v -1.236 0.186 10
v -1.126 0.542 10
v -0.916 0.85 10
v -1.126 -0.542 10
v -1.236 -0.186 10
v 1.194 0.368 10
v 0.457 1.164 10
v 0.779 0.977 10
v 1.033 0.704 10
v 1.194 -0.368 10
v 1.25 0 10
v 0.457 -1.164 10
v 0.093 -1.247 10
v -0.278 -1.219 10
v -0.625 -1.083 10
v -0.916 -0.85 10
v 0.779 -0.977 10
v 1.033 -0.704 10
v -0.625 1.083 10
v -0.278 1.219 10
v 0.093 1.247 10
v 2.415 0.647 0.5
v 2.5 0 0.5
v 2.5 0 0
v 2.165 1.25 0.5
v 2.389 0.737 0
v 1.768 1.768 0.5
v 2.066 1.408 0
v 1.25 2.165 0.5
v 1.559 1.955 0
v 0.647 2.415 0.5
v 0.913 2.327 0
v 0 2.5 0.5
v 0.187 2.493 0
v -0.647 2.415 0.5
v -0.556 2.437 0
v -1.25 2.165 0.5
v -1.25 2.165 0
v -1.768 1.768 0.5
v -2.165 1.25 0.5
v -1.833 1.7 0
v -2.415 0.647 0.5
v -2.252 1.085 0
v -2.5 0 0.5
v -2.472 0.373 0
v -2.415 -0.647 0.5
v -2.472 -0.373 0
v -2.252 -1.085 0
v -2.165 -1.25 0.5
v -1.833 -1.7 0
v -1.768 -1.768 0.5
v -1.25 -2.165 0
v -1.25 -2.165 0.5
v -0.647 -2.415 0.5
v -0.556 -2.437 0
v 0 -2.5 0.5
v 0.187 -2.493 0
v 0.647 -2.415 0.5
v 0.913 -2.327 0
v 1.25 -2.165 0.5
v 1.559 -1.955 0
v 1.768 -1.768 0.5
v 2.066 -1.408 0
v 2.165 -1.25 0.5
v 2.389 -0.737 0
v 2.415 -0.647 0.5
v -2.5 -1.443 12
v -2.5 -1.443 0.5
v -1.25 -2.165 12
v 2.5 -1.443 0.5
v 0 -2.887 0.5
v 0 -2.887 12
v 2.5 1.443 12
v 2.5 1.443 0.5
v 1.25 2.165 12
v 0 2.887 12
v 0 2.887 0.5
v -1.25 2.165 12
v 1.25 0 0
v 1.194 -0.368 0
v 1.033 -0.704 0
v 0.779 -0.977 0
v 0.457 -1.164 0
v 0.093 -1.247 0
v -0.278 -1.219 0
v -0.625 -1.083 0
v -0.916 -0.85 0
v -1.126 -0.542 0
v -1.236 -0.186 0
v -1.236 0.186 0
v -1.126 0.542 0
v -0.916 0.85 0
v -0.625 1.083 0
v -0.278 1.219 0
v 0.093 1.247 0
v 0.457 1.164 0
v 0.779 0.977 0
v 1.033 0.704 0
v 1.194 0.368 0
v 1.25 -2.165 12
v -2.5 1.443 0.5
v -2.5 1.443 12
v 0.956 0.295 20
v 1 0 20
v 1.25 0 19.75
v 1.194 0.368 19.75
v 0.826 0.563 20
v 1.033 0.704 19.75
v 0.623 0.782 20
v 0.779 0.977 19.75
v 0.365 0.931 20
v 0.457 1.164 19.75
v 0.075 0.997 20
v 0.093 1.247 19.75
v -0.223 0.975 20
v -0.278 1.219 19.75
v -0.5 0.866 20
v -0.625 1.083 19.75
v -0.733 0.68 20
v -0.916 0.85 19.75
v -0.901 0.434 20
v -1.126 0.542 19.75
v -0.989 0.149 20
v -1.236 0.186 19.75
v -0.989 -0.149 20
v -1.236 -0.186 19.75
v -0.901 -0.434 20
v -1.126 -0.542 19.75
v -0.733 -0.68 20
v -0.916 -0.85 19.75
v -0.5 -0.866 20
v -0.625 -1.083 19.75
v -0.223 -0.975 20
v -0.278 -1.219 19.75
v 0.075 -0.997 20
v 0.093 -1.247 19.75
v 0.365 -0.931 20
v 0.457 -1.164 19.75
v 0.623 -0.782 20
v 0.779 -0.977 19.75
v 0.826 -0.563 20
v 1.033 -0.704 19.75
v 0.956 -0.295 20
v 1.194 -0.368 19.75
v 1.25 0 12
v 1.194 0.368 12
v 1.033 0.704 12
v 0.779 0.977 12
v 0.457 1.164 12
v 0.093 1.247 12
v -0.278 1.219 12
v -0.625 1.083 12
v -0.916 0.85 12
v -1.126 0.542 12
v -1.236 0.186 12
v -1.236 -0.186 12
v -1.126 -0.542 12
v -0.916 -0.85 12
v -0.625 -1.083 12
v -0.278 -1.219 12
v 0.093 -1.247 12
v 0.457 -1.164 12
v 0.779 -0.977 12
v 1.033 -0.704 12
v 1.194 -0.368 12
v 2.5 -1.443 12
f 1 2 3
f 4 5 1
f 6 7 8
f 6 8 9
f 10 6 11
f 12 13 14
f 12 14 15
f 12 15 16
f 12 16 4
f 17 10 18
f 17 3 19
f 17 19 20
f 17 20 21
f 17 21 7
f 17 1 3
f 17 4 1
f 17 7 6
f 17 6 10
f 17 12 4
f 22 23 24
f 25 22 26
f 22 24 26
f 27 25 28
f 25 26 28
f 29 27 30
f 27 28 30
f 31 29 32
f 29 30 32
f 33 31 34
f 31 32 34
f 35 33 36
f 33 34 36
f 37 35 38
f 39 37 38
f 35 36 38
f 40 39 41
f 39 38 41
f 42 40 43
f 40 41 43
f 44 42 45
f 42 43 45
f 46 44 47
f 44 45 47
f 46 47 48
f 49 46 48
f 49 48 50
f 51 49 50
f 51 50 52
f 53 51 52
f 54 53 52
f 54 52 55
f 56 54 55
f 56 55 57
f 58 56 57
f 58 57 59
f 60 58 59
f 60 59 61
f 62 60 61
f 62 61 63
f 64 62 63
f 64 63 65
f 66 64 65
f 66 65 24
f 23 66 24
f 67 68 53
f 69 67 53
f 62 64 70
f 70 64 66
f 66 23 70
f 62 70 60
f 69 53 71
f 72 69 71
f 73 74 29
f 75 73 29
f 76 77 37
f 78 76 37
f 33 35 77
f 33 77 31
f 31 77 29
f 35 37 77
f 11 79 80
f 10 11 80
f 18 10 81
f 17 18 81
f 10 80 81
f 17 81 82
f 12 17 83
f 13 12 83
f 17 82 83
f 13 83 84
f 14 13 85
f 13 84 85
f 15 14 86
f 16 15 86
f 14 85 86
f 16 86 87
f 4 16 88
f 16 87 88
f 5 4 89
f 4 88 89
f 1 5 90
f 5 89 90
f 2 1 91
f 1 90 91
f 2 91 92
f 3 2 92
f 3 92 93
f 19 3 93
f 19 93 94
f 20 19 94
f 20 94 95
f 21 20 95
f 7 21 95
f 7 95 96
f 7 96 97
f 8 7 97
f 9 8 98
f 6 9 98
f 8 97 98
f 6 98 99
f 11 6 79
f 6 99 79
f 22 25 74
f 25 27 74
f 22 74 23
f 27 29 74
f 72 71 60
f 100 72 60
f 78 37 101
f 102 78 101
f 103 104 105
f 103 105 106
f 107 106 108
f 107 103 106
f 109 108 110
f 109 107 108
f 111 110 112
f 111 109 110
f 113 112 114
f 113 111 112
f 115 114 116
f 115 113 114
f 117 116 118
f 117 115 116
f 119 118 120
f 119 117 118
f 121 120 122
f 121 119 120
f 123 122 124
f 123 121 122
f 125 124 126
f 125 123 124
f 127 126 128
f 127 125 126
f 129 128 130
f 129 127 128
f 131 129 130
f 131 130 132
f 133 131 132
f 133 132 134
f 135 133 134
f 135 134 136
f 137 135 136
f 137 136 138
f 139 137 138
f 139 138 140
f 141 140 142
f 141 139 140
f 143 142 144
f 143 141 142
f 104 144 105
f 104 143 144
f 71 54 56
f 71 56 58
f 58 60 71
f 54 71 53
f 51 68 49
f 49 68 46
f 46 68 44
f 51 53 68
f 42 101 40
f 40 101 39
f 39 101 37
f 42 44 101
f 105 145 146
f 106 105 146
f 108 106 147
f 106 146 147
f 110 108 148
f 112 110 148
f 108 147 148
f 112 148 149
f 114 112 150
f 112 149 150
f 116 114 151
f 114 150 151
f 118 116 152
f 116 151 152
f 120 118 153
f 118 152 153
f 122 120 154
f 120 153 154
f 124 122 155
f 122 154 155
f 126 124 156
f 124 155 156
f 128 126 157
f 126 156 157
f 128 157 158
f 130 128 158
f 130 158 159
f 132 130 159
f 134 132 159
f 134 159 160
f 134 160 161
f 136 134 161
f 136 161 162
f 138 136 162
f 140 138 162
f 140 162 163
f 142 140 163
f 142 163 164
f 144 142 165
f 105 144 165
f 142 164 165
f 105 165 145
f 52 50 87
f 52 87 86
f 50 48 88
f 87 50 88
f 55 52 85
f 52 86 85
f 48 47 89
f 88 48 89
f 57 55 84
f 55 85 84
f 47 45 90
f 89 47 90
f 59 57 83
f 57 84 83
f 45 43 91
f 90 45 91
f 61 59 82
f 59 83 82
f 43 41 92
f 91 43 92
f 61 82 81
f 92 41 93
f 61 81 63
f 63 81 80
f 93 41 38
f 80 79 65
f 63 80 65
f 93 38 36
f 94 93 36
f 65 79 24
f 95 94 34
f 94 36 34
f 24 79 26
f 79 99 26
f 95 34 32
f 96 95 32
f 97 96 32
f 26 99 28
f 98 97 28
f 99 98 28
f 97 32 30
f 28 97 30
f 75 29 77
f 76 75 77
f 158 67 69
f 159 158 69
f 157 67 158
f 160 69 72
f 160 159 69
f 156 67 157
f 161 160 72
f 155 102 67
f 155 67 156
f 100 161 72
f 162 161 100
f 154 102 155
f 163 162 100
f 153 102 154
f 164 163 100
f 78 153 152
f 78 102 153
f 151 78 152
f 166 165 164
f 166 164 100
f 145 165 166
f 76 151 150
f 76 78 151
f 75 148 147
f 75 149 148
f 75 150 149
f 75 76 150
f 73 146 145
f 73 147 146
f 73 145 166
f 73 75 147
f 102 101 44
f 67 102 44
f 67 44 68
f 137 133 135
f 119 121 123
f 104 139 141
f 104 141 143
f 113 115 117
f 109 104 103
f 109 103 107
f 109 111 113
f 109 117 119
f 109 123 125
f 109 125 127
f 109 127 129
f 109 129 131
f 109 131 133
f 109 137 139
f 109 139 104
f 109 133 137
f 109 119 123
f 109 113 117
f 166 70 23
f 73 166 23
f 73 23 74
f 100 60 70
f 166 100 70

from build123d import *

# Parameters (mm, degrees)
F0_R     = 2.5
F1_DEPTH = 0.5
F3_DEPTH = 11.5
F4_R     = 1.25
F5_DEPTH = 8
F6_SIZE  = 0.25
F7_R     = 1.25
F8_DEPTH = 10


with BuildPart() as f1:
    # F0 (on Top) → F1 (new body)
    with BuildSketch(Plane.XY):
        Circle(F0_R)
    extrude(amount=F1_DEPTH)

    # F2 (on face) → F3 (join)
    with BuildSketch(Plane.XY.offset(0.5)):
        with BuildLine():
            Line((2.5, 0), (2.5, 1.443375673))
            Line((2.5, 1.443375673), (1.2500000021, 2.1650635082))
            ThreePointArc((1.2500000021, 2.1650635082), (2.1650635101, 1.2499999989), (2.5, 0))
        make_face()
        with BuildLine():
            Line((2.5, -1.443375673), (2.5, 0))
            ThreePointArc((2.5, 0), (2.1650635101, -1.2499999989), (1.2500000021, -2.1650635082))
            Line((1.2500000021, -2.1650635082), (2.5, -1.443375673))
        make_face()
        with BuildLine():
            Line((0, -2.8867513459), (1.2500000021, -2.1650635082))
            ThreePointArc((1.2500000021, -2.1650635082), (-1.35e-08, -2.5), (-1.2500000255, -2.1650634947))
            Line((-1.2500000255, -2.1650634947), (0, -2.8867513459))
        make_face()
        with BuildLine():
            Line((-2.5, -1.443375673), (-1.2500000255, -2.1650634947))
            ThreePointArc((-1.2500000255, -2.1650634947), (-2.1650635168, -1.2499999872), (-2.5, 0))
            Line((-2.5, 0), (-2.5, -1.443375673))
        make_face()
        with BuildLine():
            ThreePointArc((-2.5, 0), (-2.1650634924, 1.2500000296), (-1.2499999408, 2.1650635436))
            Line((-1.2499999408, 2.1650635436), (-2.5, 1.443375673))
            Line((-2.5, 1.443375673), (-2.5, 0))
        make_face()
        with BuildLine():
            ThreePointArc((1.2500000021, -2.1650635082), (2.1650635101, -1.2499999989), (2.5, 0))
            ThreePointArc((2.5, 0), (2.1650635101, 1.2499999989), (1.2500000021, 2.1650635082))
            ThreePointArc((1.2500000021, 2.1650635082), (3.54e-08, 2.5), (-1.2499999408, 2.1650635436))
            ThreePointArc((-1.2499999408, 2.1650635436), (-2.1650634924, 1.2500000296), (-2.5, 0))
            ThreePointArc((-2.5, 0), (-2.1650635168, -1.2499999872), (-1.2500000255, -2.1650634947))
            ThreePointArc((-1.2500000255, -2.1650634947), (-1.35e-08, -2.5), (1.2500000021, -2.1650635082))
        make_face()
        with BuildLine():
            ThreePointArc((-1.2499999408, 2.1650635436), (3.54e-08, 2.5), (1.2500000021, 2.1650635082))
            Line((1.2500000021, 2.1650635082), (0, 2.8867513459))
            Line((0, 2.8867513459), (-1.2499999408, 2.1650635436))
        make_face()
    extrude(amount=F3_DEPTH)

    # F4 (on face) → F5 (join)
    with BuildSketch(Plane.XY.offset(12)):
        Circle(F4_R)
    extrude(amount=F5_DEPTH)

    # F6
    f6_edges = [f1.edges().sort_by_distance(p)[0] for p in [
        (-1.25, 0, 20),
    ]]
    chamfer(f6_edges, length=F6_SIZE)

    # F7 (on face) → F8 (cut)
    with BuildSketch(Plane(origin=(0, 0, 0), x_dir=(1, 0, 0), z_dir=(0, 0, -1))):
        Circle(F7_R)
    extrude(amount=-F8_DEPTH, mode=Mode.SUBTRACT)


solid = f1.part
